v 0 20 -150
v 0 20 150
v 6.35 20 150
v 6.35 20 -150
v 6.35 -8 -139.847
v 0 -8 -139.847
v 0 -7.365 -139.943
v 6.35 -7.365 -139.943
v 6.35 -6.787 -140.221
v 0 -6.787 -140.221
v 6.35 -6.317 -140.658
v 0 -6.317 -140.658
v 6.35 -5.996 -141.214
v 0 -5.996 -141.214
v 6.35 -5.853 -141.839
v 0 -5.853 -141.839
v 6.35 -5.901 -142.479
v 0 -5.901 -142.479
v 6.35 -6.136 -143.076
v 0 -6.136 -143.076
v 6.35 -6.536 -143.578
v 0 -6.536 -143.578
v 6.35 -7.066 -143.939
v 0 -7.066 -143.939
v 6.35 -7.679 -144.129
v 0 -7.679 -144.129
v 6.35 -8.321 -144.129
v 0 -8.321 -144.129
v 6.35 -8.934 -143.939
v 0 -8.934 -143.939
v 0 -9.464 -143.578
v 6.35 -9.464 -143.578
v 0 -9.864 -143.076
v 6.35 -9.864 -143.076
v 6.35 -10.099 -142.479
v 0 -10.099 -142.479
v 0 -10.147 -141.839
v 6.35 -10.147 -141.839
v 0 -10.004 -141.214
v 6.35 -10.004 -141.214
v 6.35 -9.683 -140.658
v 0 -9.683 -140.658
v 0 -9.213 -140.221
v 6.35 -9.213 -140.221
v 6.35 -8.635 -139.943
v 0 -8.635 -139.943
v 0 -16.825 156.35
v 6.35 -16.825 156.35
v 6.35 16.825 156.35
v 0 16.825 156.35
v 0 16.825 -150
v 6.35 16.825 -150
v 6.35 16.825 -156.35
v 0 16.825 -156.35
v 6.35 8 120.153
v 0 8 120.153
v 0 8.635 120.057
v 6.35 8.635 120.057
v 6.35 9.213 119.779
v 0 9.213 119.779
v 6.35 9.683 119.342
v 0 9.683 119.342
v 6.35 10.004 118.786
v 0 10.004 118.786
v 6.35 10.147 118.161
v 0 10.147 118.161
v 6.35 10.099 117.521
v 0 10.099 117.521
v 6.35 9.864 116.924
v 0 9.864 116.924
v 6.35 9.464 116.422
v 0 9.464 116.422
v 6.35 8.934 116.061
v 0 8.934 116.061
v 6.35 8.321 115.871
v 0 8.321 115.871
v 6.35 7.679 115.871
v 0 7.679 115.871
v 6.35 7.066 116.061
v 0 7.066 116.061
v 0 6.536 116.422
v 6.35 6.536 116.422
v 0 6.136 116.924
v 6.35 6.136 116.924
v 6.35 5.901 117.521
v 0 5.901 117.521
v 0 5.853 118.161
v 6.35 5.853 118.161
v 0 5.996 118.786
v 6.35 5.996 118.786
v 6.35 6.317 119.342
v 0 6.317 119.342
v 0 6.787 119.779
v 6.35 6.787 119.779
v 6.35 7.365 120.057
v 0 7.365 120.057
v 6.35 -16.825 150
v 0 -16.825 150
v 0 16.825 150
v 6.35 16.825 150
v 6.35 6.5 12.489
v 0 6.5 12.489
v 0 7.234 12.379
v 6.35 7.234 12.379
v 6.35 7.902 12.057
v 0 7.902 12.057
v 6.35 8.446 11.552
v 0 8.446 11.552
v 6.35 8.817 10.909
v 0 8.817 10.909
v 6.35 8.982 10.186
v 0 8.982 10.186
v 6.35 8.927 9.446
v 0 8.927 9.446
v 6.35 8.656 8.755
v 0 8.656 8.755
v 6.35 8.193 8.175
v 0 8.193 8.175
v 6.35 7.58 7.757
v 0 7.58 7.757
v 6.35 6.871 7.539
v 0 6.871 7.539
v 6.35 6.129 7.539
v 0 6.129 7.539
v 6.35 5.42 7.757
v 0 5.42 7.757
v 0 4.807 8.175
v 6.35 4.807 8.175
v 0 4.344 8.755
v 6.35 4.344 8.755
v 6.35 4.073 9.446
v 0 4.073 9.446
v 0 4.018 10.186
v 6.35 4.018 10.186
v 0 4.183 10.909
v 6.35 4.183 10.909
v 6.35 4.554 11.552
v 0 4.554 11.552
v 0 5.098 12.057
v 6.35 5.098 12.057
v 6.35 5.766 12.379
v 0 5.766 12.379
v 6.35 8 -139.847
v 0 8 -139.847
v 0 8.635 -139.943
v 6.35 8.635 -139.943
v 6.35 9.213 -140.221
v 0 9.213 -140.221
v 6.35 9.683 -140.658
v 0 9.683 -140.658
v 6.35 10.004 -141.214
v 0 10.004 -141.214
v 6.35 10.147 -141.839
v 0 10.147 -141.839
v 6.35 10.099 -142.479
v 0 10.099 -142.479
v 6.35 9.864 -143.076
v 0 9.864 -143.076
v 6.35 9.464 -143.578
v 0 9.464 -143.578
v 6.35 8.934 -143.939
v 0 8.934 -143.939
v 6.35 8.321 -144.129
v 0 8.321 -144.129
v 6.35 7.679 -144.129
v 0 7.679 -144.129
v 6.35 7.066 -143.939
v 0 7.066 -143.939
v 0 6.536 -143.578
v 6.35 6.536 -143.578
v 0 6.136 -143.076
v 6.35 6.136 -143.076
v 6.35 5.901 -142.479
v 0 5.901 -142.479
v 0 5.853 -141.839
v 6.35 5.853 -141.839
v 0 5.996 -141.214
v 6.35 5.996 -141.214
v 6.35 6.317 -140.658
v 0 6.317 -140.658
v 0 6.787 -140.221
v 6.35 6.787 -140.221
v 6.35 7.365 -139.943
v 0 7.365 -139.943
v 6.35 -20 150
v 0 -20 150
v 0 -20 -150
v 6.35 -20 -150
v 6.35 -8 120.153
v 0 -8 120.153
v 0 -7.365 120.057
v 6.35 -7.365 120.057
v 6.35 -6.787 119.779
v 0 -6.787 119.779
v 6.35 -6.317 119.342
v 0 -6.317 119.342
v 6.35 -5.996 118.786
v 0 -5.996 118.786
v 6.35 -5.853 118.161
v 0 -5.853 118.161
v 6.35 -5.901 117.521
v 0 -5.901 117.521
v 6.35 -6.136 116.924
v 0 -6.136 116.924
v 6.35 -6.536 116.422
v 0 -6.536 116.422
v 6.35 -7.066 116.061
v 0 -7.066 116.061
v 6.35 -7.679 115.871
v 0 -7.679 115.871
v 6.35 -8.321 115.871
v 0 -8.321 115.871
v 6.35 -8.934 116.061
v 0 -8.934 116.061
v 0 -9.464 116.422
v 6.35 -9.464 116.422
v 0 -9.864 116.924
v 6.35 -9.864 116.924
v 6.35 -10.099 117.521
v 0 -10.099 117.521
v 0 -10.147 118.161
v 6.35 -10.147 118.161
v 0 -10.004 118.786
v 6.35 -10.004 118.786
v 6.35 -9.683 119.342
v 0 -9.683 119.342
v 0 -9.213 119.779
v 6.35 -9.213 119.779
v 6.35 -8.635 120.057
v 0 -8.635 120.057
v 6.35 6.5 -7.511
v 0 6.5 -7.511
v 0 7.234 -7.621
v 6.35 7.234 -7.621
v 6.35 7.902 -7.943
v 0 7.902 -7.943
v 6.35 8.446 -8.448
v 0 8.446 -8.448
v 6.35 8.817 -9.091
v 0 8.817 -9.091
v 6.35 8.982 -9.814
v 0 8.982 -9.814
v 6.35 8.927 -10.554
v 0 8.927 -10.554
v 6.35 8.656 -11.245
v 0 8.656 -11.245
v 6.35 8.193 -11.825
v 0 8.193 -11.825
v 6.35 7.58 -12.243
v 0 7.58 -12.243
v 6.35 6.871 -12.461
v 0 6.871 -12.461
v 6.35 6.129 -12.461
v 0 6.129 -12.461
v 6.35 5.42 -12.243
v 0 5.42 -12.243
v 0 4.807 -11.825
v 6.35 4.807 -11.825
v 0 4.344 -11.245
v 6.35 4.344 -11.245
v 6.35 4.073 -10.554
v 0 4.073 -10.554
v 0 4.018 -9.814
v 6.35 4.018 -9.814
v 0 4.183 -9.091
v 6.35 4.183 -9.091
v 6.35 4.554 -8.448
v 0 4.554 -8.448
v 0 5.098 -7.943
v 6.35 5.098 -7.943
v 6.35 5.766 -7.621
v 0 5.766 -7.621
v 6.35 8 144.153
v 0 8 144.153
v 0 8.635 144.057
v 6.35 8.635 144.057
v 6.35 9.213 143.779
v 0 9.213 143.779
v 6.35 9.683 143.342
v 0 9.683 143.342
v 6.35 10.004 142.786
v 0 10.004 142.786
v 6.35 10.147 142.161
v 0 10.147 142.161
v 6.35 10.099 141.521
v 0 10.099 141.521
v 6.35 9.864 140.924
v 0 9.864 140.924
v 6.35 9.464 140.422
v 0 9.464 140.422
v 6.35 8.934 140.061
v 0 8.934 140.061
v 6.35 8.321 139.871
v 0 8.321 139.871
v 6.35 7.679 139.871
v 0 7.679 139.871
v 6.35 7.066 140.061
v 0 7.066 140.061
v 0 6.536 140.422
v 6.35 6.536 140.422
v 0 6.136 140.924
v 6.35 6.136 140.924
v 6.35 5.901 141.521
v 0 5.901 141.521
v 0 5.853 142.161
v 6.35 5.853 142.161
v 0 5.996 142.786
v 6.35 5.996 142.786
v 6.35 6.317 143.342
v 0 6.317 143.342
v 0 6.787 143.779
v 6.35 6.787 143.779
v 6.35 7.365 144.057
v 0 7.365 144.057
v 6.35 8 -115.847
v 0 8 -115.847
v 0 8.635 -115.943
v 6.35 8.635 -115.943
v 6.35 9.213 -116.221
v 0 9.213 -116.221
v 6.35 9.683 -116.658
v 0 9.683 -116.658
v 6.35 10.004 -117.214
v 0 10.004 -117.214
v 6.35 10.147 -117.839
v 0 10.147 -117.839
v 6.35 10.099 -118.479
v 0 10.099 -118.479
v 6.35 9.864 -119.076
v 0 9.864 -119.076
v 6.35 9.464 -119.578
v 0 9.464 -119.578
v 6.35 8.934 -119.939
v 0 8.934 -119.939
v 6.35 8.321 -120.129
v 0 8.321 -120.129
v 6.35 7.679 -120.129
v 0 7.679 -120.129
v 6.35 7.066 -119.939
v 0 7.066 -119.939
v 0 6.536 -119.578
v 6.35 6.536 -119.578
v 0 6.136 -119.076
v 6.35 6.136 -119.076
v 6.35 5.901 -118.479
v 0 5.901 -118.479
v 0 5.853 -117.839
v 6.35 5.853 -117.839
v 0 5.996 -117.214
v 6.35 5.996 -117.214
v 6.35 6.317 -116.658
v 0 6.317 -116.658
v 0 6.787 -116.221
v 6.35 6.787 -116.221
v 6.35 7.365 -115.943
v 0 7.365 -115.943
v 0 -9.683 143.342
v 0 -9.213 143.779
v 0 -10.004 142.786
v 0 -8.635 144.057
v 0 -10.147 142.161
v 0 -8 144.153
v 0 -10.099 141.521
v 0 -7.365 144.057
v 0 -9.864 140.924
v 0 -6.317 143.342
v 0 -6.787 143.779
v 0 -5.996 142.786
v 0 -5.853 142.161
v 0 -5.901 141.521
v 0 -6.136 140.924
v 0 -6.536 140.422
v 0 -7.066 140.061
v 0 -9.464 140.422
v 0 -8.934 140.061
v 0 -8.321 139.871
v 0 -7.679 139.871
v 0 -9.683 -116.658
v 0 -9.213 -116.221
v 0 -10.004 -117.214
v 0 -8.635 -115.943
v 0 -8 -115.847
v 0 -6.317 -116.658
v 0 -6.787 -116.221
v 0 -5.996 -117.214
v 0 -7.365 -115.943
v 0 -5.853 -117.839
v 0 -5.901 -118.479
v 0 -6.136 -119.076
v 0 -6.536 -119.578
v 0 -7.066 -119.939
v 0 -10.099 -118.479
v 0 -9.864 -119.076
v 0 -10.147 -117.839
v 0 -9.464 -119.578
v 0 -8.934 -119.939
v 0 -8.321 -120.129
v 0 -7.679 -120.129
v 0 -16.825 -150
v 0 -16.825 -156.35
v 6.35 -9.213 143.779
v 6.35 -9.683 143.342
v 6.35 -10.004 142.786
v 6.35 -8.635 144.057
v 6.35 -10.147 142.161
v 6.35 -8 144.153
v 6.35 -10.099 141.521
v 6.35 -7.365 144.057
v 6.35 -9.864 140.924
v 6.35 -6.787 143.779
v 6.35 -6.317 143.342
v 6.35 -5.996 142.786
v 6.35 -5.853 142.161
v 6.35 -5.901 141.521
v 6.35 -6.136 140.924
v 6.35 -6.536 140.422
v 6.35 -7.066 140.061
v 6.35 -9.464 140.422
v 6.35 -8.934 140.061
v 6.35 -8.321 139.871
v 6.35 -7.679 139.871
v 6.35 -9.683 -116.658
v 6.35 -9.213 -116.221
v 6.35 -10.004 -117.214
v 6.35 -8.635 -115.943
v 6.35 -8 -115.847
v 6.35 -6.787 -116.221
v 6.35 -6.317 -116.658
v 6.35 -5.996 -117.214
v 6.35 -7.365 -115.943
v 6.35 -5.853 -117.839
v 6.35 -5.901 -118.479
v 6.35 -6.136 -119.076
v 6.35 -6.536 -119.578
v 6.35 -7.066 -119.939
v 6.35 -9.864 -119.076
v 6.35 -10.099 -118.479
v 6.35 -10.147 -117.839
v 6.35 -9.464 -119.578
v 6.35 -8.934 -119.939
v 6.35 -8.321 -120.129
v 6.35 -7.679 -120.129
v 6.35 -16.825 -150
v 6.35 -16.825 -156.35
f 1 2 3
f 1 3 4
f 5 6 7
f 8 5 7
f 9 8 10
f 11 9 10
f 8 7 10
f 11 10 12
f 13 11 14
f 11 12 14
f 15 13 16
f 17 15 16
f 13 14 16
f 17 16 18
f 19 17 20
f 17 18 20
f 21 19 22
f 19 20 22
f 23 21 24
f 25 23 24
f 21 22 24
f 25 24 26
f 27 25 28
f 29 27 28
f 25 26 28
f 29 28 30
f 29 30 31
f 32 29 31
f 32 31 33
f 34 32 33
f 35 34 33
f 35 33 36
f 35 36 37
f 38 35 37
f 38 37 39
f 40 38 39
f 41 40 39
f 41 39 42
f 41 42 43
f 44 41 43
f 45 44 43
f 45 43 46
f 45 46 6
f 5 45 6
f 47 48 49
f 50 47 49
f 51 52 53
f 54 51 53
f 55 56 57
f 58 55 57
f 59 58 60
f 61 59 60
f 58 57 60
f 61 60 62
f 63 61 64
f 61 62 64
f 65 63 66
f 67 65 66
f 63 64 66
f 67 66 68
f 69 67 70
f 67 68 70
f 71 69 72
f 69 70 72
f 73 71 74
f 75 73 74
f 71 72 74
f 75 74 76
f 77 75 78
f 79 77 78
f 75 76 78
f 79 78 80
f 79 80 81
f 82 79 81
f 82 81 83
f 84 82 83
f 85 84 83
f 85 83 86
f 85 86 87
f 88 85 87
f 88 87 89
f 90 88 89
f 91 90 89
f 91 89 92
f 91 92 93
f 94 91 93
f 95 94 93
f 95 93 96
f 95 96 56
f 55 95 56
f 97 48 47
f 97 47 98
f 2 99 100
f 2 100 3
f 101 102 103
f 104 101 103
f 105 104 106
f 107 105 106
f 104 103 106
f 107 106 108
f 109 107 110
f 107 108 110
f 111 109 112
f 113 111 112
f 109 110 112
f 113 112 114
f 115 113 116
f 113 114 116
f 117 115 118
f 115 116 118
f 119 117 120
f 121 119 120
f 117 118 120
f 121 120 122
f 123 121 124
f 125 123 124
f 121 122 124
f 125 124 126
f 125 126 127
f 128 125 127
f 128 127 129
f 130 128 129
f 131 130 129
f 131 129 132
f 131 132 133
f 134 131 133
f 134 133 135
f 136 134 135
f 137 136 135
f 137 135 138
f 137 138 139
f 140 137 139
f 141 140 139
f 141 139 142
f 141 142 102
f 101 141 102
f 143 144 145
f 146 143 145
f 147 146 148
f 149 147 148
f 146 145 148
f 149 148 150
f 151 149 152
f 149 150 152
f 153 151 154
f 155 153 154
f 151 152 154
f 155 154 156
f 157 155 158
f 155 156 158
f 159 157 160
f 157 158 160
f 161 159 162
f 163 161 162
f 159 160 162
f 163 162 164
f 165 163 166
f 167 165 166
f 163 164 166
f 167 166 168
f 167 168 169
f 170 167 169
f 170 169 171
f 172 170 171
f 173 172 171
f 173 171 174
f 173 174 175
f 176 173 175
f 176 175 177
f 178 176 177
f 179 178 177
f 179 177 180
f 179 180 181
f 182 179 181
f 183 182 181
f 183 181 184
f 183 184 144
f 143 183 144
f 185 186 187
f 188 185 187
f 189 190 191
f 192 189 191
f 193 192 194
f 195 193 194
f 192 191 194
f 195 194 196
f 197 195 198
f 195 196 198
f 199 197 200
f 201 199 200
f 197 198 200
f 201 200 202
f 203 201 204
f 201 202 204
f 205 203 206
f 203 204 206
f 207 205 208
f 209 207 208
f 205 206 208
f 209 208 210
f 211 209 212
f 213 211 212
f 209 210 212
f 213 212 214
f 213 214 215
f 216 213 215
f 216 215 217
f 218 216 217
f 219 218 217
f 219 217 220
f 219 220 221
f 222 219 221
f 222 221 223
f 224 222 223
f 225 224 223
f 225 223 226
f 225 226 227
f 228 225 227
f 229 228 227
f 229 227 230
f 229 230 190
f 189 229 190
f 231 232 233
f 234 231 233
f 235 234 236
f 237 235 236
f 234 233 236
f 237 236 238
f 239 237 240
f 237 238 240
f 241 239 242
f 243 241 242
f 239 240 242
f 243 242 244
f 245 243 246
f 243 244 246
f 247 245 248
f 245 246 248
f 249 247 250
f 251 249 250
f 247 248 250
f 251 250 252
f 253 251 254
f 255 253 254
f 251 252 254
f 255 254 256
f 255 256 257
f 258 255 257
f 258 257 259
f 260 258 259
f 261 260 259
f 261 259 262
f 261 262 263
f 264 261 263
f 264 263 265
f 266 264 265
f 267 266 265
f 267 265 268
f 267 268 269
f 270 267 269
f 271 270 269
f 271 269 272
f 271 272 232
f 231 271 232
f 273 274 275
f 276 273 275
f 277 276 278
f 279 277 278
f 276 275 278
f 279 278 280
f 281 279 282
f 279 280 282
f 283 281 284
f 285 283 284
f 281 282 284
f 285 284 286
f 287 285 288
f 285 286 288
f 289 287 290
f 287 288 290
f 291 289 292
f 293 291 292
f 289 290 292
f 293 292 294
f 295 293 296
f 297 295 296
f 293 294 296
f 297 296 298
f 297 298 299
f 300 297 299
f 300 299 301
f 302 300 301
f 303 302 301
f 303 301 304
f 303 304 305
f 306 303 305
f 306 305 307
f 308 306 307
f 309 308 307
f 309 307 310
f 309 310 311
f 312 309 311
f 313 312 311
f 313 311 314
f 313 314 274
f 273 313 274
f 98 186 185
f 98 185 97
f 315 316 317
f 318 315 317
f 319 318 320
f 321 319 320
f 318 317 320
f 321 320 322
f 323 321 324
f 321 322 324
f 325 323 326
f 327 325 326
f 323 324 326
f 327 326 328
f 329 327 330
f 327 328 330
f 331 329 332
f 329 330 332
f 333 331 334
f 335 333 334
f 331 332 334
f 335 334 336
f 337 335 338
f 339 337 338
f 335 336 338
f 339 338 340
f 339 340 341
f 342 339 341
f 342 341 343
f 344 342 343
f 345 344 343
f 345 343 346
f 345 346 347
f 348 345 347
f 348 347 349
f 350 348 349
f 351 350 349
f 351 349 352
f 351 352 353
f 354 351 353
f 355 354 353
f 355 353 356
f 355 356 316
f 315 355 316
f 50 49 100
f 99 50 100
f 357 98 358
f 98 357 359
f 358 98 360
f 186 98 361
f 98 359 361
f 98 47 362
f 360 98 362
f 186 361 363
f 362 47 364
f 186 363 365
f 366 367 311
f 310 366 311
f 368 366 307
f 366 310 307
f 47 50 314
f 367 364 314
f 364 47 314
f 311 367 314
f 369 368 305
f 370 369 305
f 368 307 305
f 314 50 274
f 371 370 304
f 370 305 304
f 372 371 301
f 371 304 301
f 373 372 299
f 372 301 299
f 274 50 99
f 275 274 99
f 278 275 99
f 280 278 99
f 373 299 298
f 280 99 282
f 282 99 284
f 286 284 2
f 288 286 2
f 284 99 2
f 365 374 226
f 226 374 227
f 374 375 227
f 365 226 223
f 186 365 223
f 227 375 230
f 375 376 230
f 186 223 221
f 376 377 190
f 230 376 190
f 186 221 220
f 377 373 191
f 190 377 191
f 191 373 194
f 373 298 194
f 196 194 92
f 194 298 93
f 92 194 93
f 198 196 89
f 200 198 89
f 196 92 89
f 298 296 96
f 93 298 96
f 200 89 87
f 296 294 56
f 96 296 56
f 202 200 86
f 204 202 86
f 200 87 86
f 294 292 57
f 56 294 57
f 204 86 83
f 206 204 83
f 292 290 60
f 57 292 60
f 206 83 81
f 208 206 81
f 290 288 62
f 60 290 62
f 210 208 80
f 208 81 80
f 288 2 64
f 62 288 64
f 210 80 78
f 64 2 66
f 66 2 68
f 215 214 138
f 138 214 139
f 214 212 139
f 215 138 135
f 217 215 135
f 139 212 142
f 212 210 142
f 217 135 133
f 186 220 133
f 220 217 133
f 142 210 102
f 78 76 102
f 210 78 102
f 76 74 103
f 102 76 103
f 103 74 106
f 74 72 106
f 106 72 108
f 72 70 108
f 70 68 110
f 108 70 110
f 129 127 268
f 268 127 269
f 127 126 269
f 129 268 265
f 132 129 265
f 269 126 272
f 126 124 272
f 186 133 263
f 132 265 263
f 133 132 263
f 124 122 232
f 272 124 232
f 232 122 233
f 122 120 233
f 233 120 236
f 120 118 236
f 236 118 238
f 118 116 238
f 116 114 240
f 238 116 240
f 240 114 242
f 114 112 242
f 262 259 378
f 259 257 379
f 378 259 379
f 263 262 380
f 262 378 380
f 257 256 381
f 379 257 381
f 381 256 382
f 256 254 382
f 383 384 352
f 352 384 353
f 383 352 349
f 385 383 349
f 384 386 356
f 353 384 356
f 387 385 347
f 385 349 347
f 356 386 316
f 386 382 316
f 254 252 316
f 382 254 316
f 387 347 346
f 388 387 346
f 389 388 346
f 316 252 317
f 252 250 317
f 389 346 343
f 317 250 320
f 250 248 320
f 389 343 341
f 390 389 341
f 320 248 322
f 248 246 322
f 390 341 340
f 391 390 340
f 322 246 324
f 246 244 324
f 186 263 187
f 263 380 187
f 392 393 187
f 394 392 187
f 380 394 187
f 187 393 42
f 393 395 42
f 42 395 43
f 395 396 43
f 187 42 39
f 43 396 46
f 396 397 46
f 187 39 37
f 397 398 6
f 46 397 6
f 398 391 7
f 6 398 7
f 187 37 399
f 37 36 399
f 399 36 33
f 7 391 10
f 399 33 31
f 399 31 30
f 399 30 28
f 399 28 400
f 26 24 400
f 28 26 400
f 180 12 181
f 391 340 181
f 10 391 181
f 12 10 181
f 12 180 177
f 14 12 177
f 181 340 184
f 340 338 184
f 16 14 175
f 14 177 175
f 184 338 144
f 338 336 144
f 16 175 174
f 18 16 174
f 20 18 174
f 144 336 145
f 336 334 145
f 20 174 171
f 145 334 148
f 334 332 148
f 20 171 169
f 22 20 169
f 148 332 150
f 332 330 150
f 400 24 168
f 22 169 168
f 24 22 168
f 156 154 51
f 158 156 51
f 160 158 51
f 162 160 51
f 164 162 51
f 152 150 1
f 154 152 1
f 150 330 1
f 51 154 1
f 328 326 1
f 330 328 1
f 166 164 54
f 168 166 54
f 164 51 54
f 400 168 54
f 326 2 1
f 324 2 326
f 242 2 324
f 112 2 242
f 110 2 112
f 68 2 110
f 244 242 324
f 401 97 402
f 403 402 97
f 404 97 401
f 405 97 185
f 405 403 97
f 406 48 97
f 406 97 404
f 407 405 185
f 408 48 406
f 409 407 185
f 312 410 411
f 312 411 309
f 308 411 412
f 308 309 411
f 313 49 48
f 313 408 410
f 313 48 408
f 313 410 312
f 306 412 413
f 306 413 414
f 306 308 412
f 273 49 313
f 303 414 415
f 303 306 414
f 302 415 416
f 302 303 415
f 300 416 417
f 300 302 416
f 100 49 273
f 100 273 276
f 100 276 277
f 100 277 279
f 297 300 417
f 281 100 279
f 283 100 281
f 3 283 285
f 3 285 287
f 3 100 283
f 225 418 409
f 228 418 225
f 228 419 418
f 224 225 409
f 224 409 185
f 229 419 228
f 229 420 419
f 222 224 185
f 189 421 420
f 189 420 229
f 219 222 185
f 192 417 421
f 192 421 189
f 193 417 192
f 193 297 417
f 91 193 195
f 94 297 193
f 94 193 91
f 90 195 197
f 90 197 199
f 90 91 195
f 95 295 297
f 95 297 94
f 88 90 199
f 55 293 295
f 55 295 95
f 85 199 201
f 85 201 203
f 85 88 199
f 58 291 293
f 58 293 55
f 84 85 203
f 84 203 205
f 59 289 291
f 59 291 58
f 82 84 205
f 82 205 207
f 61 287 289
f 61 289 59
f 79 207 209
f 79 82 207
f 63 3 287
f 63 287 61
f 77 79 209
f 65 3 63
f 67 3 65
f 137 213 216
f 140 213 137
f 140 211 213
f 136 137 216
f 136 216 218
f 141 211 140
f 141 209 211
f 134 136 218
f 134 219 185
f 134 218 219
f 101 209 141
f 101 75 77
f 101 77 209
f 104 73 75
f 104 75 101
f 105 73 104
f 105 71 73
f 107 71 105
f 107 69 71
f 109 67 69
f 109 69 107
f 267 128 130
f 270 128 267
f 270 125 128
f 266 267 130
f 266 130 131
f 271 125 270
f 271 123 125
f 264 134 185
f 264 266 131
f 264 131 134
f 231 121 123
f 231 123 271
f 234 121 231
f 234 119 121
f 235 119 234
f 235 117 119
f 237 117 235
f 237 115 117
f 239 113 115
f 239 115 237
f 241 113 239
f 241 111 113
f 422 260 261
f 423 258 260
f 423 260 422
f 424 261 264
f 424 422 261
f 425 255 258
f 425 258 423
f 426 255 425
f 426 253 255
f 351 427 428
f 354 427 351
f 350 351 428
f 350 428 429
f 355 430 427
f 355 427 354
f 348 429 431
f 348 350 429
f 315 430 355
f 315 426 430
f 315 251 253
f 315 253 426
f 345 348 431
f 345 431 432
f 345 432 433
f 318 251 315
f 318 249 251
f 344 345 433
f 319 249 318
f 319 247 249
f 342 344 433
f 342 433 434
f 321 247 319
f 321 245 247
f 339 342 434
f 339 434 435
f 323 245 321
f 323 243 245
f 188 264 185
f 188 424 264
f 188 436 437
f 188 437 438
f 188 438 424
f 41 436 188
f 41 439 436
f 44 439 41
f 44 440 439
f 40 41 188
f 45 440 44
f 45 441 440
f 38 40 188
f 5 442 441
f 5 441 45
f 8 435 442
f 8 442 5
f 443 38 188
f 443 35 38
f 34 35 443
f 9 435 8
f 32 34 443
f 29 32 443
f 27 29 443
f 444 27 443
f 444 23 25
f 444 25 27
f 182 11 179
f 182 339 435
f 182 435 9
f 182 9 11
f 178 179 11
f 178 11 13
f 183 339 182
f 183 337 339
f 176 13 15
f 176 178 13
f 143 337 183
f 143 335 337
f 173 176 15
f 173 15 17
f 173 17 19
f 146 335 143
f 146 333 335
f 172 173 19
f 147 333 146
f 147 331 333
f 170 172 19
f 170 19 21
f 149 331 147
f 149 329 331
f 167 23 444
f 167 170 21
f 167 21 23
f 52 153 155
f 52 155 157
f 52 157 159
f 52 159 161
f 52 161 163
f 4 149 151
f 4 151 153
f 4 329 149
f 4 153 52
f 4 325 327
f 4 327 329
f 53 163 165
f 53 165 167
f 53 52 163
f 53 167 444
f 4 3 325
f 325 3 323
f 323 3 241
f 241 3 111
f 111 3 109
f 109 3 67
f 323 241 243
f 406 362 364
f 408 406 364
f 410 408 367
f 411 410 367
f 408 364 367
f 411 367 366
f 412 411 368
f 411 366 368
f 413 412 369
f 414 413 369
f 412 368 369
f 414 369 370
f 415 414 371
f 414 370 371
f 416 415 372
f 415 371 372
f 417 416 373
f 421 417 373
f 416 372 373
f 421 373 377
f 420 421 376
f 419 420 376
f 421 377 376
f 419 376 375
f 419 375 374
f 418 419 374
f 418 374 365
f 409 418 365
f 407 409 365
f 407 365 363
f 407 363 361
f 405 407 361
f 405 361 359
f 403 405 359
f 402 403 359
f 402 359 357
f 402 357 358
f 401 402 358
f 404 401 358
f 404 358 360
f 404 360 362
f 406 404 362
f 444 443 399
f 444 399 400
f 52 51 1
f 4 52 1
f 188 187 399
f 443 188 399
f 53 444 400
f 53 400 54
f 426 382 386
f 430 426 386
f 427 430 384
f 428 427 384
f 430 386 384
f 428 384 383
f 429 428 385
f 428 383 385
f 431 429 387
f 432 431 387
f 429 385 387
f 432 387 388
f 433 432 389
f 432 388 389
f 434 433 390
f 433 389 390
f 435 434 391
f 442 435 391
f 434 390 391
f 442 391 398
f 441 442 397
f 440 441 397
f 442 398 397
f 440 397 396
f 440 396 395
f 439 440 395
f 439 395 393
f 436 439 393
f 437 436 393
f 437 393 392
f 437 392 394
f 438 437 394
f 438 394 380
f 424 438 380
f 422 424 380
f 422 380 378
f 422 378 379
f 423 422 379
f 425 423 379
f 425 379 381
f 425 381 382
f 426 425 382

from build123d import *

# Parameters (mm, degrees)
SKETCH1_W              = 300
SKETCH1_H              = 40
BOSS_EXTRUDE1_DEPTH    = 6.35
SKETCH2_W              = 6.35
SKETCH2_H              = 33.65
BOSS_EXTRUDE2_DEPTH    = 6.35
F_10_CLEARANCE_HOLE1_D = 4.9784
F_8_CLEARANCE_HOLE1_D  = 4.3053


with BuildPart() as part:
    # Sketch1 → Boss-Extrude1 (new body)
    with BuildSketch(Plane(origin=(0, 0, 0), x_dir=(0, 0, -1), z_dir=(1, 0, 0))):
        Rectangle(SKETCH1_W, SKETCH1_H)
    extrude(amount=BOSS_EXTRUDE1_DEPTH)

    # Sketch2 → Boss-Extrude2 (add)
    with BuildSketch(Plane(origin=(6.35, 0, 0), x_dir=(0, 0, -1), z_dir=(1, 0, 0))):
        with Locations((-153.175, 0)):
            Rectangle(SKETCH2_W, SKETCH2_H)
        with Locations((153.175, 0)):
            Rectangle(SKETCH2_W, SKETCH2_H)
    extrude(amount=-BOSS_EXTRUDE2_DEPTH)

    # #10 Clearance Hole1 (through all)
    with Locations(Plane(origin=(6.35, 0, 0), x_dir=(0, 0, -1), z_dir=(1, 0, 0))):
        with Locations((-10, 6.5), (10, 6.5)):
            Hole(F_10_CLEARANCE_HOLE1_D / 2)

    # #8 Clearance Hole1 (through all)
    with Locations(Plane(origin=(6.35, 0, 0), x_dir=(0, 0, -1), z_dir=(1, 0, 0))):
        with Locations((-142, 8), (-118, 8), (-118, -8), (-142, -8), (118, 8), (142, 8), (142, -8), (118, -8)):
            Hole(F_8_CLEARANCE_HOLE1_D / 2)


solid = part.part
